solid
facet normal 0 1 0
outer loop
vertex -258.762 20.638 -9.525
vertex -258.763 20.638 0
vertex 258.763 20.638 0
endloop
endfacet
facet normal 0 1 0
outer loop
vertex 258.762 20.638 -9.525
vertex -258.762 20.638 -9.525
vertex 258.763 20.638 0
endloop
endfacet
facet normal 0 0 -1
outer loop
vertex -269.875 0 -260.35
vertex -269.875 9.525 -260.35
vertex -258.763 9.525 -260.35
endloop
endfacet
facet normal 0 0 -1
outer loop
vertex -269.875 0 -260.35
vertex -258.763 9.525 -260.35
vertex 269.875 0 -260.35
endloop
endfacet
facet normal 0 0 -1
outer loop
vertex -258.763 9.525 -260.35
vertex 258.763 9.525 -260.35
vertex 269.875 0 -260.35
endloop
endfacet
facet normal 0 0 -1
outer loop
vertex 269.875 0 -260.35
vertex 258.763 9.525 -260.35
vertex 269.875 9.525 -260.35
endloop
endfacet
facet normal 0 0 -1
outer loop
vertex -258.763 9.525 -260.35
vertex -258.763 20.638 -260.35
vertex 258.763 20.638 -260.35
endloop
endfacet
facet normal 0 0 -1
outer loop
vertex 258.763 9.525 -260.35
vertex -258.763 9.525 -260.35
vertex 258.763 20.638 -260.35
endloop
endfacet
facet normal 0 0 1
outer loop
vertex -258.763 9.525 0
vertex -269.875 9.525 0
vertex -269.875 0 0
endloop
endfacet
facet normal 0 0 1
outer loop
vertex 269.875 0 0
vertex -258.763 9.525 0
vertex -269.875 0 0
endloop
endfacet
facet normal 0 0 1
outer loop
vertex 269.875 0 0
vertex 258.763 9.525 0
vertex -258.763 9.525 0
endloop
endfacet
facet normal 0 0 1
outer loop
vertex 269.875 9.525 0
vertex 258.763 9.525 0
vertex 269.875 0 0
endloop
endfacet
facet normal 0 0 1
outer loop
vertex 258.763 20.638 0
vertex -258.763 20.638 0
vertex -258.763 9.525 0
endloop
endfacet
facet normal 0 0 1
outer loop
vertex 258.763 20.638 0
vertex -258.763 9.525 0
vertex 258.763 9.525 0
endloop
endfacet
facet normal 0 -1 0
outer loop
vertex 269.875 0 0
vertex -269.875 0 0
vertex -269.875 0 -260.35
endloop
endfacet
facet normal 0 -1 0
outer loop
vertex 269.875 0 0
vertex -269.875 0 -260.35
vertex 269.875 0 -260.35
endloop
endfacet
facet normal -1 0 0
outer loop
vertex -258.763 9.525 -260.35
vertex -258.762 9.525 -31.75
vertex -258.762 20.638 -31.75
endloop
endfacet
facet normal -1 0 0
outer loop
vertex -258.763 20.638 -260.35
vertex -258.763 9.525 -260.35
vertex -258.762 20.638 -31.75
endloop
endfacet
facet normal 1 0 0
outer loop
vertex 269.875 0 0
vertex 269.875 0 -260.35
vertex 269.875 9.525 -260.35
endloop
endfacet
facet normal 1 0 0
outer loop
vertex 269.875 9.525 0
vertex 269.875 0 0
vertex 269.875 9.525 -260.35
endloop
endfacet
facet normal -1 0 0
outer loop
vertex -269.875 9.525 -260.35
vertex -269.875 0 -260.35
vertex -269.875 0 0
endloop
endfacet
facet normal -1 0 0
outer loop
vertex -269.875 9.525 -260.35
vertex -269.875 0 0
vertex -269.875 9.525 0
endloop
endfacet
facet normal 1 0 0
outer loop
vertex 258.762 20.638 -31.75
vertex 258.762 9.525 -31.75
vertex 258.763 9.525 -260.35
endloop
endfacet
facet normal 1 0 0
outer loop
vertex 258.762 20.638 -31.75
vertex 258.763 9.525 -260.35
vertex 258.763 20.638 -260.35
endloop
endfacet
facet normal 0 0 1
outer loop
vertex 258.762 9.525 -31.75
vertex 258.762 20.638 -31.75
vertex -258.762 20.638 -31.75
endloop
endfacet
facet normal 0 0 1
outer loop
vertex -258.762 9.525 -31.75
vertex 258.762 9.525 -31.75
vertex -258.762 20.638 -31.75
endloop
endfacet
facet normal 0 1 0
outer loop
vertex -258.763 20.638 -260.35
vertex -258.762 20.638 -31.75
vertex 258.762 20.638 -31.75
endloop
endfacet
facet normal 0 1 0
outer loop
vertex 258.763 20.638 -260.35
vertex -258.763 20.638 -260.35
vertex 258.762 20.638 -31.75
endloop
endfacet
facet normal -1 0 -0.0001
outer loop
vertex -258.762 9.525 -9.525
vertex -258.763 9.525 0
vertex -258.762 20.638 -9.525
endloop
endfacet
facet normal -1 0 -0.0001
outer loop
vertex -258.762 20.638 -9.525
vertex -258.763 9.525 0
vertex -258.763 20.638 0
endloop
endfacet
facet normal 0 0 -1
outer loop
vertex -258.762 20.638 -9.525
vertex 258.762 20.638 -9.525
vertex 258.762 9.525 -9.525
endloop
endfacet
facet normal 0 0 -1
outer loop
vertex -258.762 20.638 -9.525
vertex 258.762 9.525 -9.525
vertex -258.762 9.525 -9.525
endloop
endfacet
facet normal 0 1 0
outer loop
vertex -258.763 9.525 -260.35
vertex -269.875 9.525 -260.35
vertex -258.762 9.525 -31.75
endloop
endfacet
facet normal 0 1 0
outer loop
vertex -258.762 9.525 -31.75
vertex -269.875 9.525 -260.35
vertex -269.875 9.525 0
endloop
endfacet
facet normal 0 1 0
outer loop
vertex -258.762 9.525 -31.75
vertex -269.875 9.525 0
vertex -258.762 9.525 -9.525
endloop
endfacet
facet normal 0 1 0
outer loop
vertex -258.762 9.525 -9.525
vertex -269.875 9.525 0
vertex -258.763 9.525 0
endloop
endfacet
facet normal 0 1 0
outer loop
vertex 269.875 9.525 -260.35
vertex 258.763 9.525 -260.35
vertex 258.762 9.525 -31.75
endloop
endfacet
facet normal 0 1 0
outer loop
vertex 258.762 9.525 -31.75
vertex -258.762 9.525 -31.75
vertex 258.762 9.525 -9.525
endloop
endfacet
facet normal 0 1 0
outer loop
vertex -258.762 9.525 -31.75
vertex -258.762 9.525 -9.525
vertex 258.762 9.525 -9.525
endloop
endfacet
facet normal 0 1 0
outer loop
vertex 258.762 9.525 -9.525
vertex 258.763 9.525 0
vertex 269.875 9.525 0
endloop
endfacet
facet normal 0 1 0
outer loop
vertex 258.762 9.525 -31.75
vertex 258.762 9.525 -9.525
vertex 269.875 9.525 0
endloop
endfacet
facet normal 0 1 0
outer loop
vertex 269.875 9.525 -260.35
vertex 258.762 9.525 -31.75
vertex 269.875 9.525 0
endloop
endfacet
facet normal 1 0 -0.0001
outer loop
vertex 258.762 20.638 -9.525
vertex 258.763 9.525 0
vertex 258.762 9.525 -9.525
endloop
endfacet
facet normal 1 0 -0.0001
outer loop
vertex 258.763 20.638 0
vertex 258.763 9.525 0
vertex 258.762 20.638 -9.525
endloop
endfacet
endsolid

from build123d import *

# Parameters (mm, degrees)
F0_W     = 539.75
F0_H     = 20.6375
F1_DEPTH = 260.35
F2_W     = 11.1125
F2_H     = 11.1125
F3_DEPTH = 260.351
F4_W     = 517.525
F4_H     = 22.225
F5_DEPTH = 11.1125


with BuildPart() as f1:
    # F0 (on Top) → F1 (new body)
    with BuildSketch(Plane.XY):
        with Locations((0, 10.31875)):
            Rectangle(F0_W, F0_H)
    extrude(amount=-F1_DEPTH)

    # F2 (on face) → F3 (cut, through all)
    with BuildSketch(Plane.XY):
        with Locations((-264.31875, 15.08125)):
            Rectangle(F2_W, F2_H)
        with Locations((264.31875, 15.08125)):
            Rectangle(F2_W, F2_H)
    extrude(amount=-F3_DEPTH, mode=Mode.SUBTRACT)

    # F4 (on face) → F5 (cut, through all)
    with BuildSketch(Plane(origin=(0, 20.6375, 0), x_dir=(-1, 0, 0), z_dir=(0, 1, 0))):
        with Locations((0, -20.6375)):
            Rectangle(F4_W, F4_H)
    extrude(amount=-F5_DEPTH, mode=Mode.SUBTRACT)


solid = f1.part
